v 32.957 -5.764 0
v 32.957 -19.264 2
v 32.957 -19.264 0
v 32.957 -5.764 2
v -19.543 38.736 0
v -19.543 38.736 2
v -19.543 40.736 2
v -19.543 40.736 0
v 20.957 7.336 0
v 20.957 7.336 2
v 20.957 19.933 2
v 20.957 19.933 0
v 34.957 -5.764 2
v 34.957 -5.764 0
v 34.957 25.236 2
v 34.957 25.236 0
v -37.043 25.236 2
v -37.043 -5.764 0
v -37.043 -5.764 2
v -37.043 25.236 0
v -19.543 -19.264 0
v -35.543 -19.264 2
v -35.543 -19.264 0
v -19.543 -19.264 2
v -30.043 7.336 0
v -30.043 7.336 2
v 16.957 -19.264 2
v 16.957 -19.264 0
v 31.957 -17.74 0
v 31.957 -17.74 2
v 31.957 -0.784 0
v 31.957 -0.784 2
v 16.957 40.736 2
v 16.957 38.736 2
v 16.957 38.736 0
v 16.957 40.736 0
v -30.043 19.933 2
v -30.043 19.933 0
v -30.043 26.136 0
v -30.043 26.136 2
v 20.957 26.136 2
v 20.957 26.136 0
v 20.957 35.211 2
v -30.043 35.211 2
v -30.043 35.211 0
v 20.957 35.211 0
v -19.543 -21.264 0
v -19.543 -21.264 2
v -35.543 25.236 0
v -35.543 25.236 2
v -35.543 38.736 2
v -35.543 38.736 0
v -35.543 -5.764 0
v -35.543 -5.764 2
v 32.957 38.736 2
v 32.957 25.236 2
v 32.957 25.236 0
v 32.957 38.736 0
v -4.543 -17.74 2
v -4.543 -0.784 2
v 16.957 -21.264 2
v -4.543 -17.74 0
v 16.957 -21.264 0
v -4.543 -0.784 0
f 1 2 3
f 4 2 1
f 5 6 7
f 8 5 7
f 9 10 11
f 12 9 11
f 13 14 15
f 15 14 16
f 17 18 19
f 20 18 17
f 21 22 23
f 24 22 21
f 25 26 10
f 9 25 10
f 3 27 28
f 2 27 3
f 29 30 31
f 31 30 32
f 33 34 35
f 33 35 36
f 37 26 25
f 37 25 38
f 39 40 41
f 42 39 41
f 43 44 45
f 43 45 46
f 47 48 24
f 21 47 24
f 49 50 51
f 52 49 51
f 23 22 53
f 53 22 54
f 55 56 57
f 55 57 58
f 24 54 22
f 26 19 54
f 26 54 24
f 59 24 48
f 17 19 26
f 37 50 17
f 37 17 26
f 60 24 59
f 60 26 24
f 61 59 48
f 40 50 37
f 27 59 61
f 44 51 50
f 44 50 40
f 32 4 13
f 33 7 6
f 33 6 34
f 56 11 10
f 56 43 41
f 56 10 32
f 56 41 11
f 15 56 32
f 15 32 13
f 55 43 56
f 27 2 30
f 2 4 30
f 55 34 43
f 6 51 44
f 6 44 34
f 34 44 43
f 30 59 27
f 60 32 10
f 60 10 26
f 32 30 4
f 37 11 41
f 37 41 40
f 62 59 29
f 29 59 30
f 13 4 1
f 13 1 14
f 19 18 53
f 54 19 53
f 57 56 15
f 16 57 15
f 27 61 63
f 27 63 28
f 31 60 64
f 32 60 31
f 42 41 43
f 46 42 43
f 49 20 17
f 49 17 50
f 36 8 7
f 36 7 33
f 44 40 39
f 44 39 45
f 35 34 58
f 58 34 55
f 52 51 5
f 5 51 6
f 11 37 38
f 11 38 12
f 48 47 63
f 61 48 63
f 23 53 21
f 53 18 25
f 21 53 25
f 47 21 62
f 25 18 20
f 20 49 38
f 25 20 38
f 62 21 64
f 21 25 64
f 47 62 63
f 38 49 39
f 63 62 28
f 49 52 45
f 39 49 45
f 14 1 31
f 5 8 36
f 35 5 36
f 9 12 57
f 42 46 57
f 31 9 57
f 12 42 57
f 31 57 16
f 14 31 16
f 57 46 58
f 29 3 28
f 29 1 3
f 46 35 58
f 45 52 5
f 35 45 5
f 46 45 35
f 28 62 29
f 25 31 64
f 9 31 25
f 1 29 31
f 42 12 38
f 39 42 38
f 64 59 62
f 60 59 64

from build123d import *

# Parameters (mm, degrees)
SKETCH_1_W          = 72
SKETCH_1_H          = 62
EXTRUDE_1_DEPTH     = 2
SKETCH_2_W          = 18
SKETCH_2_H          = 2
CUT_EXTRUDE_1_DEPTH = 3
SKETCH_3_W          = 2
SKETCH_3_H          = 15.5
CUT_EXTRUDE_2_DEPTH = 3
SKETCH_4_W          = 36.5
SKETCH_4_H          = 16.955544823
SKETCH_4_W_2        = 51
SKETCH_4_H_2        = 12.596379679
SKETCH_4_H_3        = 9.075045386
CUT_EXTRUDE_3_DEPTH = 3


with BuildPart() as part:
    # ｽｹｯﾁ1 → ﾎﾞｽ - 押し出し1 (new body)
    with BuildSketch(Plane.XY):
        with Locations((-1.042641223, 9.736263736)):
            Rectangle(SKETCH_1_W, SKETCH_1_H)
    extrude(amount=EXTRUDE_1_DEPTH)

    # ｽｹｯﾁ2 → ｶｯﾄ - 押し出し1 (cut, through all)
    with BuildSketch(Plane.XY.offset(2)):
        with Locations((25.957358777, 39.736263736)):
            Rectangle(SKETCH_2_W, SKETCH_2_H)
        with Locations((-28.542641223, 39.736263736)):
            Rectangle(SKETCH_2_W, SKETCH_2_H)
        with Locations((-28.542641223, -20.263736264)):
            Rectangle(SKETCH_2_W, SKETCH_2_H)
        with Locations((25.957358777, -20.263736264)):
            Rectangle(SKETCH_2_W, SKETCH_2_H)
    extrude(amount=-CUT_EXTRUDE_1_DEPTH, mode=Mode.SUBTRACT)

    # ｽｹｯﾁ3 → ｶｯﾄ - 押し出し2 (cut, through all)
    with BuildSketch(Plane.XY.offset(2)):
        with Locations((33.957358777, 32.986263736)):
            Rectangle(SKETCH_3_W, SKETCH_3_H)
        with Locations((33.957358777, -13.513736264)):
            Rectangle(SKETCH_3_W, SKETCH_3_H)
        with Locations((-36.542641223, -13.513736264)):
            Rectangle(SKETCH_3_W, SKETCH_3_H)
        with Locations((-36.542641223, 32.986263736)):
            Rectangle(SKETCH_3_W, SKETCH_3_H)
    extrude(amount=-CUT_EXTRUDE_2_DEPTH, mode=Mode.SUBTRACT)

    # ｽｹｯﾁ4 → ｶｯﾄ - 押し出し3 (cut, through all)
    with BuildSketch(Plane.XY.offset(2)):
        with Locations((13.707358777, -9.261963853)):
            Rectangle(SKETCH_4_W, SKETCH_4_H)
        with Locations((-4.542641223, 13.634453576)):
            Rectangle(SKETCH_4_W_2, SKETCH_4_H_2)
        with Locations((-4.542641223, 30.673786429)):
            Rectangle(SKETCH_4_W_2, SKETCH_4_H_3)
    extrude(amount=-CUT_EXTRUDE_3_DEPTH, mode=Mode.SUBTRACT)


solid = part.part
